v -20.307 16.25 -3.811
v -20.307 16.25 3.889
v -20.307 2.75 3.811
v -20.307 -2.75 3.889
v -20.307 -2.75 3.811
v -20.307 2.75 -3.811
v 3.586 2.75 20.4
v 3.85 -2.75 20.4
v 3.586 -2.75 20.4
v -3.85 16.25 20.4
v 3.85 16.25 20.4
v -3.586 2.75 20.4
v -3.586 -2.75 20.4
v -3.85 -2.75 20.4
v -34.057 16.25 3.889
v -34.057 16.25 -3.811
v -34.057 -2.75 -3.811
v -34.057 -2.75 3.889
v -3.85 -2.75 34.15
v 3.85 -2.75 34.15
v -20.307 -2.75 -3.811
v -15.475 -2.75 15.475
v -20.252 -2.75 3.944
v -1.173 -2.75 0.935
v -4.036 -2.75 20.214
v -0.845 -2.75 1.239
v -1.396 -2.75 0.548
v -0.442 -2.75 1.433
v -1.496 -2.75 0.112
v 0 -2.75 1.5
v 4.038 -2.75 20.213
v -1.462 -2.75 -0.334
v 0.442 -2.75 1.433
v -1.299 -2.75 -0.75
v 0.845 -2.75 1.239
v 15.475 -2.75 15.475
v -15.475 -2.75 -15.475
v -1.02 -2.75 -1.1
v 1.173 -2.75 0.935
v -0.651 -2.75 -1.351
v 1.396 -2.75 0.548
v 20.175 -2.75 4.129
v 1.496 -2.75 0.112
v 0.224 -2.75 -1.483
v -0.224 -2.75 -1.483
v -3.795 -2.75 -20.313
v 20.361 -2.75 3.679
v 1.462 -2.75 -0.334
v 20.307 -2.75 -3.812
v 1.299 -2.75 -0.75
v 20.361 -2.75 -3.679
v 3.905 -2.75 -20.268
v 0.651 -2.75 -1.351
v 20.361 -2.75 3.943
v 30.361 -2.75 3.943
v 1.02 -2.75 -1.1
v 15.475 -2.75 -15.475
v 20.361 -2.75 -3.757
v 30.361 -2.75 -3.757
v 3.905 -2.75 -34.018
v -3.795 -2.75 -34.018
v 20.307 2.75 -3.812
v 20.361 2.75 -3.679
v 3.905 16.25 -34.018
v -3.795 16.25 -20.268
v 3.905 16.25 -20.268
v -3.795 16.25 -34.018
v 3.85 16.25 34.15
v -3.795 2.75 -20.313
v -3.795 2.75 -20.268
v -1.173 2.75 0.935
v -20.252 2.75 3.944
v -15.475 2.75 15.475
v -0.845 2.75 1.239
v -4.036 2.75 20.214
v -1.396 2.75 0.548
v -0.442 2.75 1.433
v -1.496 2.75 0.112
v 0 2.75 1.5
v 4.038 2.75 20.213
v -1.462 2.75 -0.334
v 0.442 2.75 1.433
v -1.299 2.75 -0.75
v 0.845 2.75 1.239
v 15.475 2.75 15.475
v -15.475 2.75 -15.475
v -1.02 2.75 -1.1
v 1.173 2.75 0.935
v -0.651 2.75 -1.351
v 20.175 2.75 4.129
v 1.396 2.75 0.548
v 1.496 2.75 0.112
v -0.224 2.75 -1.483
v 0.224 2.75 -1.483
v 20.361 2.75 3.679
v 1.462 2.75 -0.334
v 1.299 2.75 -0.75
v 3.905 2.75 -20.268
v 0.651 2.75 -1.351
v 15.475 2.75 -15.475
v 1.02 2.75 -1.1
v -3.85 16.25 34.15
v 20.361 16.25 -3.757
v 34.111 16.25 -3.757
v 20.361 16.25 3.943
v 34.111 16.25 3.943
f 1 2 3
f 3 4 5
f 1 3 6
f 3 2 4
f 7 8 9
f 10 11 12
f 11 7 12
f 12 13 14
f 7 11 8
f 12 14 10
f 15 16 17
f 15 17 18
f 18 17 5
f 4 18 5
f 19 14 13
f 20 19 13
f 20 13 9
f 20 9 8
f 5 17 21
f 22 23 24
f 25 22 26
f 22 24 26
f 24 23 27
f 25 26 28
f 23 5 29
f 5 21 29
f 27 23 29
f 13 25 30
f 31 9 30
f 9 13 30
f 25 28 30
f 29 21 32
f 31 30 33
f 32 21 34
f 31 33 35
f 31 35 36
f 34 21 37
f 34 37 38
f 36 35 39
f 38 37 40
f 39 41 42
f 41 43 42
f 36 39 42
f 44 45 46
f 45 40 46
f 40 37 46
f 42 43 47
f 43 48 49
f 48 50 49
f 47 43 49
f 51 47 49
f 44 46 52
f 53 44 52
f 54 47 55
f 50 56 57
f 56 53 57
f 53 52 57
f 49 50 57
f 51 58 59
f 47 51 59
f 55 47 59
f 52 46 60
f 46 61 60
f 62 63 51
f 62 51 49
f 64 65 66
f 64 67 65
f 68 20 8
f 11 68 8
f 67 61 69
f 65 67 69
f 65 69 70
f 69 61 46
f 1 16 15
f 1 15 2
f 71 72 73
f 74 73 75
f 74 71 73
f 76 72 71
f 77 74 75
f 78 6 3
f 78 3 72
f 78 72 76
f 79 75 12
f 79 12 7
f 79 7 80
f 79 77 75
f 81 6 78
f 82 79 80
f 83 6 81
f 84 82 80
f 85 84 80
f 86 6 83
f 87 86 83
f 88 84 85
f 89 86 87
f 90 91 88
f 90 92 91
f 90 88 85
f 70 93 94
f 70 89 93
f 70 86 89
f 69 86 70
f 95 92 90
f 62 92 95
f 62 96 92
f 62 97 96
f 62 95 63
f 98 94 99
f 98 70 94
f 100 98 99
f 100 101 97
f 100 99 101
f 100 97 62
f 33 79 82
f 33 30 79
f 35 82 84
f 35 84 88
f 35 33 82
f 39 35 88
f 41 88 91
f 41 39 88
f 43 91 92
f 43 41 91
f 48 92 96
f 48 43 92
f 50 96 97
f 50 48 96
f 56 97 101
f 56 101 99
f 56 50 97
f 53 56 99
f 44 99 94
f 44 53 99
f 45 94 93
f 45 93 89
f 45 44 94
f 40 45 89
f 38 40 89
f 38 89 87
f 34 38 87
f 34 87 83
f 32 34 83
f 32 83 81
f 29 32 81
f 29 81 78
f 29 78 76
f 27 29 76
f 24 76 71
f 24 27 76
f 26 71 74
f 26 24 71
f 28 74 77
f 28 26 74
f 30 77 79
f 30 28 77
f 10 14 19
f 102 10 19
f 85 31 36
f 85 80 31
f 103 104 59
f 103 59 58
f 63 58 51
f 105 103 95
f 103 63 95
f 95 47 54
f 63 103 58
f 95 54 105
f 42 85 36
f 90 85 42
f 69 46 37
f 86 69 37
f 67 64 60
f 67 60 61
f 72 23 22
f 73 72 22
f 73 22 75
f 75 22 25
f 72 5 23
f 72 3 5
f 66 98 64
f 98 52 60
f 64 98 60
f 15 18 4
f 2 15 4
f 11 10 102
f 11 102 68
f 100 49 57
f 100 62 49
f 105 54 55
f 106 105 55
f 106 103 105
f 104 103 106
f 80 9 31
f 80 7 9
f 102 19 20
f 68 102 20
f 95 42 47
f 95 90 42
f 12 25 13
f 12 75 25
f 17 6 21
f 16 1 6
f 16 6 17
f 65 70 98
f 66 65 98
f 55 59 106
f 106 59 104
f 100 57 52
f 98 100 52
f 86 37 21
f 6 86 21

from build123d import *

# Parameters (mm, degrees)
SKETCH1_R           = 1.5
BOSS_EXTRUDE5_DEPTH = 2.75
SKETCH1_10_W        = 7.7
SKETCH1_10_H        = 13.75
SKETCH1_10_W_2      = 13.75
SKETCH1_10_H_2      = 7.7
BOSS_EXTRUDE6_DEPTH = 16.25
CUT_EXTRUDE2_DEPTH  = 16.25


with BuildPart() as part:
    # Sketch1 → Boss-Extrude5 (new, symmetric)
    with BuildSketch(Plane(origin=(0, 0, 0), x_dir=(1, 0, 0), z_dir=(0, 1, 0))):
        Polygon((3.85, -34.15), (3.85, -20.4), (3.586127609, -20.4), (15.475330795, -15.475330795), (20.361356783, -3.679420587), (20.361356783, -3.943292979), (34.111356783, -3.943292979), (34.111356783, 3.756707021), (20.361356783, 3.756707021), (20.361356783, 3.679420587), (15.475330795, 15.475330795), (3.904649762, 20.268063804), (3.904649762, 34.018063804), (-3.795350238, 34.018063804), (-3.795350238, 20.313337149), (-15.475330795, 15.475330795), (-20.306707021, 3.811356783), (-34.056707021, 3.811356783), (-34.056707021, -3.888643217), (-20.306707021, -3.888643217), (-20.306707021, -3.811356783), (-15.475330795, -15.475330795), (-3.586127609, -20.4), (-3.85, -20.4), (-3.85, -34.15), align=None)
        Circle(SKETCH1_R, mode=Mode.SUBTRACT)
    extrude(amount=BOSS_EXTRUDE5_DEPTH, both=True)

    # Sketch1<10> → Boss-Extrude6 (add)
    with BuildSketch(Plane(origin=(0, 0, 0), x_dir=(1, 0, 0), z_dir=(0, 1, 0))):
        with Locations((0, -27.275)):
            Rectangle(SKETCH1_10_W, SKETCH1_10_H)
        with Locations((27.236356783, -0.093292979)):
            Rectangle(SKETCH1_10_W_2, SKETCH1_10_H_2)
        with Locations((-27.181707021, -0.038643217)):
            Rectangle(SKETCH1_10_W_2, SKETCH1_10_H_2)
        with Locations((0.054649762, 27.143063804)):
            Rectangle(SKETCH1_10_W, SKETCH1_10_H)
    extrude(amount=BOSS_EXTRUDE6_DEPTH)

    # Sketch3 → Cut-Extrude2 (cut)
    with BuildSketch(Plane(origin=(0, 0, -3.756707021), x_dir=(-1, 0, 0), z_dir=(0, 0, -1))):
        Polygon((-30.361356783, -2.75), (-34.111356783, 16.25), (-34.111356783, -2.75), align=None)
    extrude(amount=-CUT_EXTRUDE2_DEPTH, mode=Mode.SUBTRACT)


solid = part.part
